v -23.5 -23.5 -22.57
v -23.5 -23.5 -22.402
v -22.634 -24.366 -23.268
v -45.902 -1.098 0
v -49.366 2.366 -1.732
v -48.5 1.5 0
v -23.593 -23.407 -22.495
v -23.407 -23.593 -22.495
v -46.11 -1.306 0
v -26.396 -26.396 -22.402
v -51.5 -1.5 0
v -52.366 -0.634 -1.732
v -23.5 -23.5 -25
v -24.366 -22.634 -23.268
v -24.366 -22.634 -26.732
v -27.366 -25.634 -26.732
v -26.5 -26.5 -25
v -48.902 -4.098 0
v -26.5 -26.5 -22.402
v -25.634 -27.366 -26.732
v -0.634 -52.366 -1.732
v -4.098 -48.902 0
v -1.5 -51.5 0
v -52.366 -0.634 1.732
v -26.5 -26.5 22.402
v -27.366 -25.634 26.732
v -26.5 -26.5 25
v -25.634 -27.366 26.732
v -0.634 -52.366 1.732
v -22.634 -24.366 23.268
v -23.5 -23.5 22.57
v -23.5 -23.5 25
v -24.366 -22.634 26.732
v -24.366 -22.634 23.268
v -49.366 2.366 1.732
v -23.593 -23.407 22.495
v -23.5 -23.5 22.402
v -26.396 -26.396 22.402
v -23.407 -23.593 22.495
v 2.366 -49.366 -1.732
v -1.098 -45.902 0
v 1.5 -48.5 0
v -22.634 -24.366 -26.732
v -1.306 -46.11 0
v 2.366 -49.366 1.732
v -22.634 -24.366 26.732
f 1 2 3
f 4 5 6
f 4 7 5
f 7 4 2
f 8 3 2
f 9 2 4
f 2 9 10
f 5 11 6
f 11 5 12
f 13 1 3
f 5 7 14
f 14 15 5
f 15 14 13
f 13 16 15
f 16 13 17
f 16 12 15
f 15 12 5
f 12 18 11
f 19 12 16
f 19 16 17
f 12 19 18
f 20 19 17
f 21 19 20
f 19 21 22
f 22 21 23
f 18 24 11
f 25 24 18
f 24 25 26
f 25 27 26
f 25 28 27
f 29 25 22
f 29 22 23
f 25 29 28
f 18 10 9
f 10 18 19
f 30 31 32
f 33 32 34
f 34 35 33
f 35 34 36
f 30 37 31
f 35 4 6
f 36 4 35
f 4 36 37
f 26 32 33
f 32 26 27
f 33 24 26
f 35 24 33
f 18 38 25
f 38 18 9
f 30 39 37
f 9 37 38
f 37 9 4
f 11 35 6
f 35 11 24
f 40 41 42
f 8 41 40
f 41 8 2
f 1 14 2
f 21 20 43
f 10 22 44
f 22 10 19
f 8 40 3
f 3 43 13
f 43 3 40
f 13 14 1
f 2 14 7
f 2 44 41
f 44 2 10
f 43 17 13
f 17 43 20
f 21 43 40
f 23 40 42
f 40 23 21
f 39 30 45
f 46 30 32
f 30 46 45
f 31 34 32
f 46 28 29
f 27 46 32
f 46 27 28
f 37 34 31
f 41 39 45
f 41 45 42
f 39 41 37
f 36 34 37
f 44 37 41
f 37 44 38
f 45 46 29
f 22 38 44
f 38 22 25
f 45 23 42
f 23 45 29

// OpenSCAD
// -----------------------------------------------------------------------------
// Text for working on a wooden 4-cube.
// From Gemini, the interior angles of the rhombus are:
//     70.53∘ (The acute angles)
//    109.47∘ (The obtuse angles)

side = 50;          // Rod edge strut length
edgeRadius = 3;     // Rod edge strut diameter
$fn = 4;            // Rod edge strut shape: 4:square, 6:hex, 64:cylinder.

// -----------------------------------------------------------------------------
// Helper: draw a rod edge strut between two 3D points
//
module edge(p1, p2) {
    v = p2 - p1;
    h = norm(v);
    if (h > 0) {
        a = acos(v.z / h);
        rot_axis = cross([  0,   0, 1], v);
        translate(p1)
            rotate(a, rot_axis)
                cylinder(h = h, r = edgeRadius, center = false);
    }
}

// -----------------------------------------------------------------------------
module drawShape() {

       edge([-50,   0,   0], [-25, -25, -25]);
       edge([-50,   0,   0], [-25, -25,  25]);
       edge([-25, -25, -25], [  0, -50,   0]);
       edge([-25, -25,  25], [  0, -50,   0]);

}

// -----------------------------------------------------------------------------
drawShape();
